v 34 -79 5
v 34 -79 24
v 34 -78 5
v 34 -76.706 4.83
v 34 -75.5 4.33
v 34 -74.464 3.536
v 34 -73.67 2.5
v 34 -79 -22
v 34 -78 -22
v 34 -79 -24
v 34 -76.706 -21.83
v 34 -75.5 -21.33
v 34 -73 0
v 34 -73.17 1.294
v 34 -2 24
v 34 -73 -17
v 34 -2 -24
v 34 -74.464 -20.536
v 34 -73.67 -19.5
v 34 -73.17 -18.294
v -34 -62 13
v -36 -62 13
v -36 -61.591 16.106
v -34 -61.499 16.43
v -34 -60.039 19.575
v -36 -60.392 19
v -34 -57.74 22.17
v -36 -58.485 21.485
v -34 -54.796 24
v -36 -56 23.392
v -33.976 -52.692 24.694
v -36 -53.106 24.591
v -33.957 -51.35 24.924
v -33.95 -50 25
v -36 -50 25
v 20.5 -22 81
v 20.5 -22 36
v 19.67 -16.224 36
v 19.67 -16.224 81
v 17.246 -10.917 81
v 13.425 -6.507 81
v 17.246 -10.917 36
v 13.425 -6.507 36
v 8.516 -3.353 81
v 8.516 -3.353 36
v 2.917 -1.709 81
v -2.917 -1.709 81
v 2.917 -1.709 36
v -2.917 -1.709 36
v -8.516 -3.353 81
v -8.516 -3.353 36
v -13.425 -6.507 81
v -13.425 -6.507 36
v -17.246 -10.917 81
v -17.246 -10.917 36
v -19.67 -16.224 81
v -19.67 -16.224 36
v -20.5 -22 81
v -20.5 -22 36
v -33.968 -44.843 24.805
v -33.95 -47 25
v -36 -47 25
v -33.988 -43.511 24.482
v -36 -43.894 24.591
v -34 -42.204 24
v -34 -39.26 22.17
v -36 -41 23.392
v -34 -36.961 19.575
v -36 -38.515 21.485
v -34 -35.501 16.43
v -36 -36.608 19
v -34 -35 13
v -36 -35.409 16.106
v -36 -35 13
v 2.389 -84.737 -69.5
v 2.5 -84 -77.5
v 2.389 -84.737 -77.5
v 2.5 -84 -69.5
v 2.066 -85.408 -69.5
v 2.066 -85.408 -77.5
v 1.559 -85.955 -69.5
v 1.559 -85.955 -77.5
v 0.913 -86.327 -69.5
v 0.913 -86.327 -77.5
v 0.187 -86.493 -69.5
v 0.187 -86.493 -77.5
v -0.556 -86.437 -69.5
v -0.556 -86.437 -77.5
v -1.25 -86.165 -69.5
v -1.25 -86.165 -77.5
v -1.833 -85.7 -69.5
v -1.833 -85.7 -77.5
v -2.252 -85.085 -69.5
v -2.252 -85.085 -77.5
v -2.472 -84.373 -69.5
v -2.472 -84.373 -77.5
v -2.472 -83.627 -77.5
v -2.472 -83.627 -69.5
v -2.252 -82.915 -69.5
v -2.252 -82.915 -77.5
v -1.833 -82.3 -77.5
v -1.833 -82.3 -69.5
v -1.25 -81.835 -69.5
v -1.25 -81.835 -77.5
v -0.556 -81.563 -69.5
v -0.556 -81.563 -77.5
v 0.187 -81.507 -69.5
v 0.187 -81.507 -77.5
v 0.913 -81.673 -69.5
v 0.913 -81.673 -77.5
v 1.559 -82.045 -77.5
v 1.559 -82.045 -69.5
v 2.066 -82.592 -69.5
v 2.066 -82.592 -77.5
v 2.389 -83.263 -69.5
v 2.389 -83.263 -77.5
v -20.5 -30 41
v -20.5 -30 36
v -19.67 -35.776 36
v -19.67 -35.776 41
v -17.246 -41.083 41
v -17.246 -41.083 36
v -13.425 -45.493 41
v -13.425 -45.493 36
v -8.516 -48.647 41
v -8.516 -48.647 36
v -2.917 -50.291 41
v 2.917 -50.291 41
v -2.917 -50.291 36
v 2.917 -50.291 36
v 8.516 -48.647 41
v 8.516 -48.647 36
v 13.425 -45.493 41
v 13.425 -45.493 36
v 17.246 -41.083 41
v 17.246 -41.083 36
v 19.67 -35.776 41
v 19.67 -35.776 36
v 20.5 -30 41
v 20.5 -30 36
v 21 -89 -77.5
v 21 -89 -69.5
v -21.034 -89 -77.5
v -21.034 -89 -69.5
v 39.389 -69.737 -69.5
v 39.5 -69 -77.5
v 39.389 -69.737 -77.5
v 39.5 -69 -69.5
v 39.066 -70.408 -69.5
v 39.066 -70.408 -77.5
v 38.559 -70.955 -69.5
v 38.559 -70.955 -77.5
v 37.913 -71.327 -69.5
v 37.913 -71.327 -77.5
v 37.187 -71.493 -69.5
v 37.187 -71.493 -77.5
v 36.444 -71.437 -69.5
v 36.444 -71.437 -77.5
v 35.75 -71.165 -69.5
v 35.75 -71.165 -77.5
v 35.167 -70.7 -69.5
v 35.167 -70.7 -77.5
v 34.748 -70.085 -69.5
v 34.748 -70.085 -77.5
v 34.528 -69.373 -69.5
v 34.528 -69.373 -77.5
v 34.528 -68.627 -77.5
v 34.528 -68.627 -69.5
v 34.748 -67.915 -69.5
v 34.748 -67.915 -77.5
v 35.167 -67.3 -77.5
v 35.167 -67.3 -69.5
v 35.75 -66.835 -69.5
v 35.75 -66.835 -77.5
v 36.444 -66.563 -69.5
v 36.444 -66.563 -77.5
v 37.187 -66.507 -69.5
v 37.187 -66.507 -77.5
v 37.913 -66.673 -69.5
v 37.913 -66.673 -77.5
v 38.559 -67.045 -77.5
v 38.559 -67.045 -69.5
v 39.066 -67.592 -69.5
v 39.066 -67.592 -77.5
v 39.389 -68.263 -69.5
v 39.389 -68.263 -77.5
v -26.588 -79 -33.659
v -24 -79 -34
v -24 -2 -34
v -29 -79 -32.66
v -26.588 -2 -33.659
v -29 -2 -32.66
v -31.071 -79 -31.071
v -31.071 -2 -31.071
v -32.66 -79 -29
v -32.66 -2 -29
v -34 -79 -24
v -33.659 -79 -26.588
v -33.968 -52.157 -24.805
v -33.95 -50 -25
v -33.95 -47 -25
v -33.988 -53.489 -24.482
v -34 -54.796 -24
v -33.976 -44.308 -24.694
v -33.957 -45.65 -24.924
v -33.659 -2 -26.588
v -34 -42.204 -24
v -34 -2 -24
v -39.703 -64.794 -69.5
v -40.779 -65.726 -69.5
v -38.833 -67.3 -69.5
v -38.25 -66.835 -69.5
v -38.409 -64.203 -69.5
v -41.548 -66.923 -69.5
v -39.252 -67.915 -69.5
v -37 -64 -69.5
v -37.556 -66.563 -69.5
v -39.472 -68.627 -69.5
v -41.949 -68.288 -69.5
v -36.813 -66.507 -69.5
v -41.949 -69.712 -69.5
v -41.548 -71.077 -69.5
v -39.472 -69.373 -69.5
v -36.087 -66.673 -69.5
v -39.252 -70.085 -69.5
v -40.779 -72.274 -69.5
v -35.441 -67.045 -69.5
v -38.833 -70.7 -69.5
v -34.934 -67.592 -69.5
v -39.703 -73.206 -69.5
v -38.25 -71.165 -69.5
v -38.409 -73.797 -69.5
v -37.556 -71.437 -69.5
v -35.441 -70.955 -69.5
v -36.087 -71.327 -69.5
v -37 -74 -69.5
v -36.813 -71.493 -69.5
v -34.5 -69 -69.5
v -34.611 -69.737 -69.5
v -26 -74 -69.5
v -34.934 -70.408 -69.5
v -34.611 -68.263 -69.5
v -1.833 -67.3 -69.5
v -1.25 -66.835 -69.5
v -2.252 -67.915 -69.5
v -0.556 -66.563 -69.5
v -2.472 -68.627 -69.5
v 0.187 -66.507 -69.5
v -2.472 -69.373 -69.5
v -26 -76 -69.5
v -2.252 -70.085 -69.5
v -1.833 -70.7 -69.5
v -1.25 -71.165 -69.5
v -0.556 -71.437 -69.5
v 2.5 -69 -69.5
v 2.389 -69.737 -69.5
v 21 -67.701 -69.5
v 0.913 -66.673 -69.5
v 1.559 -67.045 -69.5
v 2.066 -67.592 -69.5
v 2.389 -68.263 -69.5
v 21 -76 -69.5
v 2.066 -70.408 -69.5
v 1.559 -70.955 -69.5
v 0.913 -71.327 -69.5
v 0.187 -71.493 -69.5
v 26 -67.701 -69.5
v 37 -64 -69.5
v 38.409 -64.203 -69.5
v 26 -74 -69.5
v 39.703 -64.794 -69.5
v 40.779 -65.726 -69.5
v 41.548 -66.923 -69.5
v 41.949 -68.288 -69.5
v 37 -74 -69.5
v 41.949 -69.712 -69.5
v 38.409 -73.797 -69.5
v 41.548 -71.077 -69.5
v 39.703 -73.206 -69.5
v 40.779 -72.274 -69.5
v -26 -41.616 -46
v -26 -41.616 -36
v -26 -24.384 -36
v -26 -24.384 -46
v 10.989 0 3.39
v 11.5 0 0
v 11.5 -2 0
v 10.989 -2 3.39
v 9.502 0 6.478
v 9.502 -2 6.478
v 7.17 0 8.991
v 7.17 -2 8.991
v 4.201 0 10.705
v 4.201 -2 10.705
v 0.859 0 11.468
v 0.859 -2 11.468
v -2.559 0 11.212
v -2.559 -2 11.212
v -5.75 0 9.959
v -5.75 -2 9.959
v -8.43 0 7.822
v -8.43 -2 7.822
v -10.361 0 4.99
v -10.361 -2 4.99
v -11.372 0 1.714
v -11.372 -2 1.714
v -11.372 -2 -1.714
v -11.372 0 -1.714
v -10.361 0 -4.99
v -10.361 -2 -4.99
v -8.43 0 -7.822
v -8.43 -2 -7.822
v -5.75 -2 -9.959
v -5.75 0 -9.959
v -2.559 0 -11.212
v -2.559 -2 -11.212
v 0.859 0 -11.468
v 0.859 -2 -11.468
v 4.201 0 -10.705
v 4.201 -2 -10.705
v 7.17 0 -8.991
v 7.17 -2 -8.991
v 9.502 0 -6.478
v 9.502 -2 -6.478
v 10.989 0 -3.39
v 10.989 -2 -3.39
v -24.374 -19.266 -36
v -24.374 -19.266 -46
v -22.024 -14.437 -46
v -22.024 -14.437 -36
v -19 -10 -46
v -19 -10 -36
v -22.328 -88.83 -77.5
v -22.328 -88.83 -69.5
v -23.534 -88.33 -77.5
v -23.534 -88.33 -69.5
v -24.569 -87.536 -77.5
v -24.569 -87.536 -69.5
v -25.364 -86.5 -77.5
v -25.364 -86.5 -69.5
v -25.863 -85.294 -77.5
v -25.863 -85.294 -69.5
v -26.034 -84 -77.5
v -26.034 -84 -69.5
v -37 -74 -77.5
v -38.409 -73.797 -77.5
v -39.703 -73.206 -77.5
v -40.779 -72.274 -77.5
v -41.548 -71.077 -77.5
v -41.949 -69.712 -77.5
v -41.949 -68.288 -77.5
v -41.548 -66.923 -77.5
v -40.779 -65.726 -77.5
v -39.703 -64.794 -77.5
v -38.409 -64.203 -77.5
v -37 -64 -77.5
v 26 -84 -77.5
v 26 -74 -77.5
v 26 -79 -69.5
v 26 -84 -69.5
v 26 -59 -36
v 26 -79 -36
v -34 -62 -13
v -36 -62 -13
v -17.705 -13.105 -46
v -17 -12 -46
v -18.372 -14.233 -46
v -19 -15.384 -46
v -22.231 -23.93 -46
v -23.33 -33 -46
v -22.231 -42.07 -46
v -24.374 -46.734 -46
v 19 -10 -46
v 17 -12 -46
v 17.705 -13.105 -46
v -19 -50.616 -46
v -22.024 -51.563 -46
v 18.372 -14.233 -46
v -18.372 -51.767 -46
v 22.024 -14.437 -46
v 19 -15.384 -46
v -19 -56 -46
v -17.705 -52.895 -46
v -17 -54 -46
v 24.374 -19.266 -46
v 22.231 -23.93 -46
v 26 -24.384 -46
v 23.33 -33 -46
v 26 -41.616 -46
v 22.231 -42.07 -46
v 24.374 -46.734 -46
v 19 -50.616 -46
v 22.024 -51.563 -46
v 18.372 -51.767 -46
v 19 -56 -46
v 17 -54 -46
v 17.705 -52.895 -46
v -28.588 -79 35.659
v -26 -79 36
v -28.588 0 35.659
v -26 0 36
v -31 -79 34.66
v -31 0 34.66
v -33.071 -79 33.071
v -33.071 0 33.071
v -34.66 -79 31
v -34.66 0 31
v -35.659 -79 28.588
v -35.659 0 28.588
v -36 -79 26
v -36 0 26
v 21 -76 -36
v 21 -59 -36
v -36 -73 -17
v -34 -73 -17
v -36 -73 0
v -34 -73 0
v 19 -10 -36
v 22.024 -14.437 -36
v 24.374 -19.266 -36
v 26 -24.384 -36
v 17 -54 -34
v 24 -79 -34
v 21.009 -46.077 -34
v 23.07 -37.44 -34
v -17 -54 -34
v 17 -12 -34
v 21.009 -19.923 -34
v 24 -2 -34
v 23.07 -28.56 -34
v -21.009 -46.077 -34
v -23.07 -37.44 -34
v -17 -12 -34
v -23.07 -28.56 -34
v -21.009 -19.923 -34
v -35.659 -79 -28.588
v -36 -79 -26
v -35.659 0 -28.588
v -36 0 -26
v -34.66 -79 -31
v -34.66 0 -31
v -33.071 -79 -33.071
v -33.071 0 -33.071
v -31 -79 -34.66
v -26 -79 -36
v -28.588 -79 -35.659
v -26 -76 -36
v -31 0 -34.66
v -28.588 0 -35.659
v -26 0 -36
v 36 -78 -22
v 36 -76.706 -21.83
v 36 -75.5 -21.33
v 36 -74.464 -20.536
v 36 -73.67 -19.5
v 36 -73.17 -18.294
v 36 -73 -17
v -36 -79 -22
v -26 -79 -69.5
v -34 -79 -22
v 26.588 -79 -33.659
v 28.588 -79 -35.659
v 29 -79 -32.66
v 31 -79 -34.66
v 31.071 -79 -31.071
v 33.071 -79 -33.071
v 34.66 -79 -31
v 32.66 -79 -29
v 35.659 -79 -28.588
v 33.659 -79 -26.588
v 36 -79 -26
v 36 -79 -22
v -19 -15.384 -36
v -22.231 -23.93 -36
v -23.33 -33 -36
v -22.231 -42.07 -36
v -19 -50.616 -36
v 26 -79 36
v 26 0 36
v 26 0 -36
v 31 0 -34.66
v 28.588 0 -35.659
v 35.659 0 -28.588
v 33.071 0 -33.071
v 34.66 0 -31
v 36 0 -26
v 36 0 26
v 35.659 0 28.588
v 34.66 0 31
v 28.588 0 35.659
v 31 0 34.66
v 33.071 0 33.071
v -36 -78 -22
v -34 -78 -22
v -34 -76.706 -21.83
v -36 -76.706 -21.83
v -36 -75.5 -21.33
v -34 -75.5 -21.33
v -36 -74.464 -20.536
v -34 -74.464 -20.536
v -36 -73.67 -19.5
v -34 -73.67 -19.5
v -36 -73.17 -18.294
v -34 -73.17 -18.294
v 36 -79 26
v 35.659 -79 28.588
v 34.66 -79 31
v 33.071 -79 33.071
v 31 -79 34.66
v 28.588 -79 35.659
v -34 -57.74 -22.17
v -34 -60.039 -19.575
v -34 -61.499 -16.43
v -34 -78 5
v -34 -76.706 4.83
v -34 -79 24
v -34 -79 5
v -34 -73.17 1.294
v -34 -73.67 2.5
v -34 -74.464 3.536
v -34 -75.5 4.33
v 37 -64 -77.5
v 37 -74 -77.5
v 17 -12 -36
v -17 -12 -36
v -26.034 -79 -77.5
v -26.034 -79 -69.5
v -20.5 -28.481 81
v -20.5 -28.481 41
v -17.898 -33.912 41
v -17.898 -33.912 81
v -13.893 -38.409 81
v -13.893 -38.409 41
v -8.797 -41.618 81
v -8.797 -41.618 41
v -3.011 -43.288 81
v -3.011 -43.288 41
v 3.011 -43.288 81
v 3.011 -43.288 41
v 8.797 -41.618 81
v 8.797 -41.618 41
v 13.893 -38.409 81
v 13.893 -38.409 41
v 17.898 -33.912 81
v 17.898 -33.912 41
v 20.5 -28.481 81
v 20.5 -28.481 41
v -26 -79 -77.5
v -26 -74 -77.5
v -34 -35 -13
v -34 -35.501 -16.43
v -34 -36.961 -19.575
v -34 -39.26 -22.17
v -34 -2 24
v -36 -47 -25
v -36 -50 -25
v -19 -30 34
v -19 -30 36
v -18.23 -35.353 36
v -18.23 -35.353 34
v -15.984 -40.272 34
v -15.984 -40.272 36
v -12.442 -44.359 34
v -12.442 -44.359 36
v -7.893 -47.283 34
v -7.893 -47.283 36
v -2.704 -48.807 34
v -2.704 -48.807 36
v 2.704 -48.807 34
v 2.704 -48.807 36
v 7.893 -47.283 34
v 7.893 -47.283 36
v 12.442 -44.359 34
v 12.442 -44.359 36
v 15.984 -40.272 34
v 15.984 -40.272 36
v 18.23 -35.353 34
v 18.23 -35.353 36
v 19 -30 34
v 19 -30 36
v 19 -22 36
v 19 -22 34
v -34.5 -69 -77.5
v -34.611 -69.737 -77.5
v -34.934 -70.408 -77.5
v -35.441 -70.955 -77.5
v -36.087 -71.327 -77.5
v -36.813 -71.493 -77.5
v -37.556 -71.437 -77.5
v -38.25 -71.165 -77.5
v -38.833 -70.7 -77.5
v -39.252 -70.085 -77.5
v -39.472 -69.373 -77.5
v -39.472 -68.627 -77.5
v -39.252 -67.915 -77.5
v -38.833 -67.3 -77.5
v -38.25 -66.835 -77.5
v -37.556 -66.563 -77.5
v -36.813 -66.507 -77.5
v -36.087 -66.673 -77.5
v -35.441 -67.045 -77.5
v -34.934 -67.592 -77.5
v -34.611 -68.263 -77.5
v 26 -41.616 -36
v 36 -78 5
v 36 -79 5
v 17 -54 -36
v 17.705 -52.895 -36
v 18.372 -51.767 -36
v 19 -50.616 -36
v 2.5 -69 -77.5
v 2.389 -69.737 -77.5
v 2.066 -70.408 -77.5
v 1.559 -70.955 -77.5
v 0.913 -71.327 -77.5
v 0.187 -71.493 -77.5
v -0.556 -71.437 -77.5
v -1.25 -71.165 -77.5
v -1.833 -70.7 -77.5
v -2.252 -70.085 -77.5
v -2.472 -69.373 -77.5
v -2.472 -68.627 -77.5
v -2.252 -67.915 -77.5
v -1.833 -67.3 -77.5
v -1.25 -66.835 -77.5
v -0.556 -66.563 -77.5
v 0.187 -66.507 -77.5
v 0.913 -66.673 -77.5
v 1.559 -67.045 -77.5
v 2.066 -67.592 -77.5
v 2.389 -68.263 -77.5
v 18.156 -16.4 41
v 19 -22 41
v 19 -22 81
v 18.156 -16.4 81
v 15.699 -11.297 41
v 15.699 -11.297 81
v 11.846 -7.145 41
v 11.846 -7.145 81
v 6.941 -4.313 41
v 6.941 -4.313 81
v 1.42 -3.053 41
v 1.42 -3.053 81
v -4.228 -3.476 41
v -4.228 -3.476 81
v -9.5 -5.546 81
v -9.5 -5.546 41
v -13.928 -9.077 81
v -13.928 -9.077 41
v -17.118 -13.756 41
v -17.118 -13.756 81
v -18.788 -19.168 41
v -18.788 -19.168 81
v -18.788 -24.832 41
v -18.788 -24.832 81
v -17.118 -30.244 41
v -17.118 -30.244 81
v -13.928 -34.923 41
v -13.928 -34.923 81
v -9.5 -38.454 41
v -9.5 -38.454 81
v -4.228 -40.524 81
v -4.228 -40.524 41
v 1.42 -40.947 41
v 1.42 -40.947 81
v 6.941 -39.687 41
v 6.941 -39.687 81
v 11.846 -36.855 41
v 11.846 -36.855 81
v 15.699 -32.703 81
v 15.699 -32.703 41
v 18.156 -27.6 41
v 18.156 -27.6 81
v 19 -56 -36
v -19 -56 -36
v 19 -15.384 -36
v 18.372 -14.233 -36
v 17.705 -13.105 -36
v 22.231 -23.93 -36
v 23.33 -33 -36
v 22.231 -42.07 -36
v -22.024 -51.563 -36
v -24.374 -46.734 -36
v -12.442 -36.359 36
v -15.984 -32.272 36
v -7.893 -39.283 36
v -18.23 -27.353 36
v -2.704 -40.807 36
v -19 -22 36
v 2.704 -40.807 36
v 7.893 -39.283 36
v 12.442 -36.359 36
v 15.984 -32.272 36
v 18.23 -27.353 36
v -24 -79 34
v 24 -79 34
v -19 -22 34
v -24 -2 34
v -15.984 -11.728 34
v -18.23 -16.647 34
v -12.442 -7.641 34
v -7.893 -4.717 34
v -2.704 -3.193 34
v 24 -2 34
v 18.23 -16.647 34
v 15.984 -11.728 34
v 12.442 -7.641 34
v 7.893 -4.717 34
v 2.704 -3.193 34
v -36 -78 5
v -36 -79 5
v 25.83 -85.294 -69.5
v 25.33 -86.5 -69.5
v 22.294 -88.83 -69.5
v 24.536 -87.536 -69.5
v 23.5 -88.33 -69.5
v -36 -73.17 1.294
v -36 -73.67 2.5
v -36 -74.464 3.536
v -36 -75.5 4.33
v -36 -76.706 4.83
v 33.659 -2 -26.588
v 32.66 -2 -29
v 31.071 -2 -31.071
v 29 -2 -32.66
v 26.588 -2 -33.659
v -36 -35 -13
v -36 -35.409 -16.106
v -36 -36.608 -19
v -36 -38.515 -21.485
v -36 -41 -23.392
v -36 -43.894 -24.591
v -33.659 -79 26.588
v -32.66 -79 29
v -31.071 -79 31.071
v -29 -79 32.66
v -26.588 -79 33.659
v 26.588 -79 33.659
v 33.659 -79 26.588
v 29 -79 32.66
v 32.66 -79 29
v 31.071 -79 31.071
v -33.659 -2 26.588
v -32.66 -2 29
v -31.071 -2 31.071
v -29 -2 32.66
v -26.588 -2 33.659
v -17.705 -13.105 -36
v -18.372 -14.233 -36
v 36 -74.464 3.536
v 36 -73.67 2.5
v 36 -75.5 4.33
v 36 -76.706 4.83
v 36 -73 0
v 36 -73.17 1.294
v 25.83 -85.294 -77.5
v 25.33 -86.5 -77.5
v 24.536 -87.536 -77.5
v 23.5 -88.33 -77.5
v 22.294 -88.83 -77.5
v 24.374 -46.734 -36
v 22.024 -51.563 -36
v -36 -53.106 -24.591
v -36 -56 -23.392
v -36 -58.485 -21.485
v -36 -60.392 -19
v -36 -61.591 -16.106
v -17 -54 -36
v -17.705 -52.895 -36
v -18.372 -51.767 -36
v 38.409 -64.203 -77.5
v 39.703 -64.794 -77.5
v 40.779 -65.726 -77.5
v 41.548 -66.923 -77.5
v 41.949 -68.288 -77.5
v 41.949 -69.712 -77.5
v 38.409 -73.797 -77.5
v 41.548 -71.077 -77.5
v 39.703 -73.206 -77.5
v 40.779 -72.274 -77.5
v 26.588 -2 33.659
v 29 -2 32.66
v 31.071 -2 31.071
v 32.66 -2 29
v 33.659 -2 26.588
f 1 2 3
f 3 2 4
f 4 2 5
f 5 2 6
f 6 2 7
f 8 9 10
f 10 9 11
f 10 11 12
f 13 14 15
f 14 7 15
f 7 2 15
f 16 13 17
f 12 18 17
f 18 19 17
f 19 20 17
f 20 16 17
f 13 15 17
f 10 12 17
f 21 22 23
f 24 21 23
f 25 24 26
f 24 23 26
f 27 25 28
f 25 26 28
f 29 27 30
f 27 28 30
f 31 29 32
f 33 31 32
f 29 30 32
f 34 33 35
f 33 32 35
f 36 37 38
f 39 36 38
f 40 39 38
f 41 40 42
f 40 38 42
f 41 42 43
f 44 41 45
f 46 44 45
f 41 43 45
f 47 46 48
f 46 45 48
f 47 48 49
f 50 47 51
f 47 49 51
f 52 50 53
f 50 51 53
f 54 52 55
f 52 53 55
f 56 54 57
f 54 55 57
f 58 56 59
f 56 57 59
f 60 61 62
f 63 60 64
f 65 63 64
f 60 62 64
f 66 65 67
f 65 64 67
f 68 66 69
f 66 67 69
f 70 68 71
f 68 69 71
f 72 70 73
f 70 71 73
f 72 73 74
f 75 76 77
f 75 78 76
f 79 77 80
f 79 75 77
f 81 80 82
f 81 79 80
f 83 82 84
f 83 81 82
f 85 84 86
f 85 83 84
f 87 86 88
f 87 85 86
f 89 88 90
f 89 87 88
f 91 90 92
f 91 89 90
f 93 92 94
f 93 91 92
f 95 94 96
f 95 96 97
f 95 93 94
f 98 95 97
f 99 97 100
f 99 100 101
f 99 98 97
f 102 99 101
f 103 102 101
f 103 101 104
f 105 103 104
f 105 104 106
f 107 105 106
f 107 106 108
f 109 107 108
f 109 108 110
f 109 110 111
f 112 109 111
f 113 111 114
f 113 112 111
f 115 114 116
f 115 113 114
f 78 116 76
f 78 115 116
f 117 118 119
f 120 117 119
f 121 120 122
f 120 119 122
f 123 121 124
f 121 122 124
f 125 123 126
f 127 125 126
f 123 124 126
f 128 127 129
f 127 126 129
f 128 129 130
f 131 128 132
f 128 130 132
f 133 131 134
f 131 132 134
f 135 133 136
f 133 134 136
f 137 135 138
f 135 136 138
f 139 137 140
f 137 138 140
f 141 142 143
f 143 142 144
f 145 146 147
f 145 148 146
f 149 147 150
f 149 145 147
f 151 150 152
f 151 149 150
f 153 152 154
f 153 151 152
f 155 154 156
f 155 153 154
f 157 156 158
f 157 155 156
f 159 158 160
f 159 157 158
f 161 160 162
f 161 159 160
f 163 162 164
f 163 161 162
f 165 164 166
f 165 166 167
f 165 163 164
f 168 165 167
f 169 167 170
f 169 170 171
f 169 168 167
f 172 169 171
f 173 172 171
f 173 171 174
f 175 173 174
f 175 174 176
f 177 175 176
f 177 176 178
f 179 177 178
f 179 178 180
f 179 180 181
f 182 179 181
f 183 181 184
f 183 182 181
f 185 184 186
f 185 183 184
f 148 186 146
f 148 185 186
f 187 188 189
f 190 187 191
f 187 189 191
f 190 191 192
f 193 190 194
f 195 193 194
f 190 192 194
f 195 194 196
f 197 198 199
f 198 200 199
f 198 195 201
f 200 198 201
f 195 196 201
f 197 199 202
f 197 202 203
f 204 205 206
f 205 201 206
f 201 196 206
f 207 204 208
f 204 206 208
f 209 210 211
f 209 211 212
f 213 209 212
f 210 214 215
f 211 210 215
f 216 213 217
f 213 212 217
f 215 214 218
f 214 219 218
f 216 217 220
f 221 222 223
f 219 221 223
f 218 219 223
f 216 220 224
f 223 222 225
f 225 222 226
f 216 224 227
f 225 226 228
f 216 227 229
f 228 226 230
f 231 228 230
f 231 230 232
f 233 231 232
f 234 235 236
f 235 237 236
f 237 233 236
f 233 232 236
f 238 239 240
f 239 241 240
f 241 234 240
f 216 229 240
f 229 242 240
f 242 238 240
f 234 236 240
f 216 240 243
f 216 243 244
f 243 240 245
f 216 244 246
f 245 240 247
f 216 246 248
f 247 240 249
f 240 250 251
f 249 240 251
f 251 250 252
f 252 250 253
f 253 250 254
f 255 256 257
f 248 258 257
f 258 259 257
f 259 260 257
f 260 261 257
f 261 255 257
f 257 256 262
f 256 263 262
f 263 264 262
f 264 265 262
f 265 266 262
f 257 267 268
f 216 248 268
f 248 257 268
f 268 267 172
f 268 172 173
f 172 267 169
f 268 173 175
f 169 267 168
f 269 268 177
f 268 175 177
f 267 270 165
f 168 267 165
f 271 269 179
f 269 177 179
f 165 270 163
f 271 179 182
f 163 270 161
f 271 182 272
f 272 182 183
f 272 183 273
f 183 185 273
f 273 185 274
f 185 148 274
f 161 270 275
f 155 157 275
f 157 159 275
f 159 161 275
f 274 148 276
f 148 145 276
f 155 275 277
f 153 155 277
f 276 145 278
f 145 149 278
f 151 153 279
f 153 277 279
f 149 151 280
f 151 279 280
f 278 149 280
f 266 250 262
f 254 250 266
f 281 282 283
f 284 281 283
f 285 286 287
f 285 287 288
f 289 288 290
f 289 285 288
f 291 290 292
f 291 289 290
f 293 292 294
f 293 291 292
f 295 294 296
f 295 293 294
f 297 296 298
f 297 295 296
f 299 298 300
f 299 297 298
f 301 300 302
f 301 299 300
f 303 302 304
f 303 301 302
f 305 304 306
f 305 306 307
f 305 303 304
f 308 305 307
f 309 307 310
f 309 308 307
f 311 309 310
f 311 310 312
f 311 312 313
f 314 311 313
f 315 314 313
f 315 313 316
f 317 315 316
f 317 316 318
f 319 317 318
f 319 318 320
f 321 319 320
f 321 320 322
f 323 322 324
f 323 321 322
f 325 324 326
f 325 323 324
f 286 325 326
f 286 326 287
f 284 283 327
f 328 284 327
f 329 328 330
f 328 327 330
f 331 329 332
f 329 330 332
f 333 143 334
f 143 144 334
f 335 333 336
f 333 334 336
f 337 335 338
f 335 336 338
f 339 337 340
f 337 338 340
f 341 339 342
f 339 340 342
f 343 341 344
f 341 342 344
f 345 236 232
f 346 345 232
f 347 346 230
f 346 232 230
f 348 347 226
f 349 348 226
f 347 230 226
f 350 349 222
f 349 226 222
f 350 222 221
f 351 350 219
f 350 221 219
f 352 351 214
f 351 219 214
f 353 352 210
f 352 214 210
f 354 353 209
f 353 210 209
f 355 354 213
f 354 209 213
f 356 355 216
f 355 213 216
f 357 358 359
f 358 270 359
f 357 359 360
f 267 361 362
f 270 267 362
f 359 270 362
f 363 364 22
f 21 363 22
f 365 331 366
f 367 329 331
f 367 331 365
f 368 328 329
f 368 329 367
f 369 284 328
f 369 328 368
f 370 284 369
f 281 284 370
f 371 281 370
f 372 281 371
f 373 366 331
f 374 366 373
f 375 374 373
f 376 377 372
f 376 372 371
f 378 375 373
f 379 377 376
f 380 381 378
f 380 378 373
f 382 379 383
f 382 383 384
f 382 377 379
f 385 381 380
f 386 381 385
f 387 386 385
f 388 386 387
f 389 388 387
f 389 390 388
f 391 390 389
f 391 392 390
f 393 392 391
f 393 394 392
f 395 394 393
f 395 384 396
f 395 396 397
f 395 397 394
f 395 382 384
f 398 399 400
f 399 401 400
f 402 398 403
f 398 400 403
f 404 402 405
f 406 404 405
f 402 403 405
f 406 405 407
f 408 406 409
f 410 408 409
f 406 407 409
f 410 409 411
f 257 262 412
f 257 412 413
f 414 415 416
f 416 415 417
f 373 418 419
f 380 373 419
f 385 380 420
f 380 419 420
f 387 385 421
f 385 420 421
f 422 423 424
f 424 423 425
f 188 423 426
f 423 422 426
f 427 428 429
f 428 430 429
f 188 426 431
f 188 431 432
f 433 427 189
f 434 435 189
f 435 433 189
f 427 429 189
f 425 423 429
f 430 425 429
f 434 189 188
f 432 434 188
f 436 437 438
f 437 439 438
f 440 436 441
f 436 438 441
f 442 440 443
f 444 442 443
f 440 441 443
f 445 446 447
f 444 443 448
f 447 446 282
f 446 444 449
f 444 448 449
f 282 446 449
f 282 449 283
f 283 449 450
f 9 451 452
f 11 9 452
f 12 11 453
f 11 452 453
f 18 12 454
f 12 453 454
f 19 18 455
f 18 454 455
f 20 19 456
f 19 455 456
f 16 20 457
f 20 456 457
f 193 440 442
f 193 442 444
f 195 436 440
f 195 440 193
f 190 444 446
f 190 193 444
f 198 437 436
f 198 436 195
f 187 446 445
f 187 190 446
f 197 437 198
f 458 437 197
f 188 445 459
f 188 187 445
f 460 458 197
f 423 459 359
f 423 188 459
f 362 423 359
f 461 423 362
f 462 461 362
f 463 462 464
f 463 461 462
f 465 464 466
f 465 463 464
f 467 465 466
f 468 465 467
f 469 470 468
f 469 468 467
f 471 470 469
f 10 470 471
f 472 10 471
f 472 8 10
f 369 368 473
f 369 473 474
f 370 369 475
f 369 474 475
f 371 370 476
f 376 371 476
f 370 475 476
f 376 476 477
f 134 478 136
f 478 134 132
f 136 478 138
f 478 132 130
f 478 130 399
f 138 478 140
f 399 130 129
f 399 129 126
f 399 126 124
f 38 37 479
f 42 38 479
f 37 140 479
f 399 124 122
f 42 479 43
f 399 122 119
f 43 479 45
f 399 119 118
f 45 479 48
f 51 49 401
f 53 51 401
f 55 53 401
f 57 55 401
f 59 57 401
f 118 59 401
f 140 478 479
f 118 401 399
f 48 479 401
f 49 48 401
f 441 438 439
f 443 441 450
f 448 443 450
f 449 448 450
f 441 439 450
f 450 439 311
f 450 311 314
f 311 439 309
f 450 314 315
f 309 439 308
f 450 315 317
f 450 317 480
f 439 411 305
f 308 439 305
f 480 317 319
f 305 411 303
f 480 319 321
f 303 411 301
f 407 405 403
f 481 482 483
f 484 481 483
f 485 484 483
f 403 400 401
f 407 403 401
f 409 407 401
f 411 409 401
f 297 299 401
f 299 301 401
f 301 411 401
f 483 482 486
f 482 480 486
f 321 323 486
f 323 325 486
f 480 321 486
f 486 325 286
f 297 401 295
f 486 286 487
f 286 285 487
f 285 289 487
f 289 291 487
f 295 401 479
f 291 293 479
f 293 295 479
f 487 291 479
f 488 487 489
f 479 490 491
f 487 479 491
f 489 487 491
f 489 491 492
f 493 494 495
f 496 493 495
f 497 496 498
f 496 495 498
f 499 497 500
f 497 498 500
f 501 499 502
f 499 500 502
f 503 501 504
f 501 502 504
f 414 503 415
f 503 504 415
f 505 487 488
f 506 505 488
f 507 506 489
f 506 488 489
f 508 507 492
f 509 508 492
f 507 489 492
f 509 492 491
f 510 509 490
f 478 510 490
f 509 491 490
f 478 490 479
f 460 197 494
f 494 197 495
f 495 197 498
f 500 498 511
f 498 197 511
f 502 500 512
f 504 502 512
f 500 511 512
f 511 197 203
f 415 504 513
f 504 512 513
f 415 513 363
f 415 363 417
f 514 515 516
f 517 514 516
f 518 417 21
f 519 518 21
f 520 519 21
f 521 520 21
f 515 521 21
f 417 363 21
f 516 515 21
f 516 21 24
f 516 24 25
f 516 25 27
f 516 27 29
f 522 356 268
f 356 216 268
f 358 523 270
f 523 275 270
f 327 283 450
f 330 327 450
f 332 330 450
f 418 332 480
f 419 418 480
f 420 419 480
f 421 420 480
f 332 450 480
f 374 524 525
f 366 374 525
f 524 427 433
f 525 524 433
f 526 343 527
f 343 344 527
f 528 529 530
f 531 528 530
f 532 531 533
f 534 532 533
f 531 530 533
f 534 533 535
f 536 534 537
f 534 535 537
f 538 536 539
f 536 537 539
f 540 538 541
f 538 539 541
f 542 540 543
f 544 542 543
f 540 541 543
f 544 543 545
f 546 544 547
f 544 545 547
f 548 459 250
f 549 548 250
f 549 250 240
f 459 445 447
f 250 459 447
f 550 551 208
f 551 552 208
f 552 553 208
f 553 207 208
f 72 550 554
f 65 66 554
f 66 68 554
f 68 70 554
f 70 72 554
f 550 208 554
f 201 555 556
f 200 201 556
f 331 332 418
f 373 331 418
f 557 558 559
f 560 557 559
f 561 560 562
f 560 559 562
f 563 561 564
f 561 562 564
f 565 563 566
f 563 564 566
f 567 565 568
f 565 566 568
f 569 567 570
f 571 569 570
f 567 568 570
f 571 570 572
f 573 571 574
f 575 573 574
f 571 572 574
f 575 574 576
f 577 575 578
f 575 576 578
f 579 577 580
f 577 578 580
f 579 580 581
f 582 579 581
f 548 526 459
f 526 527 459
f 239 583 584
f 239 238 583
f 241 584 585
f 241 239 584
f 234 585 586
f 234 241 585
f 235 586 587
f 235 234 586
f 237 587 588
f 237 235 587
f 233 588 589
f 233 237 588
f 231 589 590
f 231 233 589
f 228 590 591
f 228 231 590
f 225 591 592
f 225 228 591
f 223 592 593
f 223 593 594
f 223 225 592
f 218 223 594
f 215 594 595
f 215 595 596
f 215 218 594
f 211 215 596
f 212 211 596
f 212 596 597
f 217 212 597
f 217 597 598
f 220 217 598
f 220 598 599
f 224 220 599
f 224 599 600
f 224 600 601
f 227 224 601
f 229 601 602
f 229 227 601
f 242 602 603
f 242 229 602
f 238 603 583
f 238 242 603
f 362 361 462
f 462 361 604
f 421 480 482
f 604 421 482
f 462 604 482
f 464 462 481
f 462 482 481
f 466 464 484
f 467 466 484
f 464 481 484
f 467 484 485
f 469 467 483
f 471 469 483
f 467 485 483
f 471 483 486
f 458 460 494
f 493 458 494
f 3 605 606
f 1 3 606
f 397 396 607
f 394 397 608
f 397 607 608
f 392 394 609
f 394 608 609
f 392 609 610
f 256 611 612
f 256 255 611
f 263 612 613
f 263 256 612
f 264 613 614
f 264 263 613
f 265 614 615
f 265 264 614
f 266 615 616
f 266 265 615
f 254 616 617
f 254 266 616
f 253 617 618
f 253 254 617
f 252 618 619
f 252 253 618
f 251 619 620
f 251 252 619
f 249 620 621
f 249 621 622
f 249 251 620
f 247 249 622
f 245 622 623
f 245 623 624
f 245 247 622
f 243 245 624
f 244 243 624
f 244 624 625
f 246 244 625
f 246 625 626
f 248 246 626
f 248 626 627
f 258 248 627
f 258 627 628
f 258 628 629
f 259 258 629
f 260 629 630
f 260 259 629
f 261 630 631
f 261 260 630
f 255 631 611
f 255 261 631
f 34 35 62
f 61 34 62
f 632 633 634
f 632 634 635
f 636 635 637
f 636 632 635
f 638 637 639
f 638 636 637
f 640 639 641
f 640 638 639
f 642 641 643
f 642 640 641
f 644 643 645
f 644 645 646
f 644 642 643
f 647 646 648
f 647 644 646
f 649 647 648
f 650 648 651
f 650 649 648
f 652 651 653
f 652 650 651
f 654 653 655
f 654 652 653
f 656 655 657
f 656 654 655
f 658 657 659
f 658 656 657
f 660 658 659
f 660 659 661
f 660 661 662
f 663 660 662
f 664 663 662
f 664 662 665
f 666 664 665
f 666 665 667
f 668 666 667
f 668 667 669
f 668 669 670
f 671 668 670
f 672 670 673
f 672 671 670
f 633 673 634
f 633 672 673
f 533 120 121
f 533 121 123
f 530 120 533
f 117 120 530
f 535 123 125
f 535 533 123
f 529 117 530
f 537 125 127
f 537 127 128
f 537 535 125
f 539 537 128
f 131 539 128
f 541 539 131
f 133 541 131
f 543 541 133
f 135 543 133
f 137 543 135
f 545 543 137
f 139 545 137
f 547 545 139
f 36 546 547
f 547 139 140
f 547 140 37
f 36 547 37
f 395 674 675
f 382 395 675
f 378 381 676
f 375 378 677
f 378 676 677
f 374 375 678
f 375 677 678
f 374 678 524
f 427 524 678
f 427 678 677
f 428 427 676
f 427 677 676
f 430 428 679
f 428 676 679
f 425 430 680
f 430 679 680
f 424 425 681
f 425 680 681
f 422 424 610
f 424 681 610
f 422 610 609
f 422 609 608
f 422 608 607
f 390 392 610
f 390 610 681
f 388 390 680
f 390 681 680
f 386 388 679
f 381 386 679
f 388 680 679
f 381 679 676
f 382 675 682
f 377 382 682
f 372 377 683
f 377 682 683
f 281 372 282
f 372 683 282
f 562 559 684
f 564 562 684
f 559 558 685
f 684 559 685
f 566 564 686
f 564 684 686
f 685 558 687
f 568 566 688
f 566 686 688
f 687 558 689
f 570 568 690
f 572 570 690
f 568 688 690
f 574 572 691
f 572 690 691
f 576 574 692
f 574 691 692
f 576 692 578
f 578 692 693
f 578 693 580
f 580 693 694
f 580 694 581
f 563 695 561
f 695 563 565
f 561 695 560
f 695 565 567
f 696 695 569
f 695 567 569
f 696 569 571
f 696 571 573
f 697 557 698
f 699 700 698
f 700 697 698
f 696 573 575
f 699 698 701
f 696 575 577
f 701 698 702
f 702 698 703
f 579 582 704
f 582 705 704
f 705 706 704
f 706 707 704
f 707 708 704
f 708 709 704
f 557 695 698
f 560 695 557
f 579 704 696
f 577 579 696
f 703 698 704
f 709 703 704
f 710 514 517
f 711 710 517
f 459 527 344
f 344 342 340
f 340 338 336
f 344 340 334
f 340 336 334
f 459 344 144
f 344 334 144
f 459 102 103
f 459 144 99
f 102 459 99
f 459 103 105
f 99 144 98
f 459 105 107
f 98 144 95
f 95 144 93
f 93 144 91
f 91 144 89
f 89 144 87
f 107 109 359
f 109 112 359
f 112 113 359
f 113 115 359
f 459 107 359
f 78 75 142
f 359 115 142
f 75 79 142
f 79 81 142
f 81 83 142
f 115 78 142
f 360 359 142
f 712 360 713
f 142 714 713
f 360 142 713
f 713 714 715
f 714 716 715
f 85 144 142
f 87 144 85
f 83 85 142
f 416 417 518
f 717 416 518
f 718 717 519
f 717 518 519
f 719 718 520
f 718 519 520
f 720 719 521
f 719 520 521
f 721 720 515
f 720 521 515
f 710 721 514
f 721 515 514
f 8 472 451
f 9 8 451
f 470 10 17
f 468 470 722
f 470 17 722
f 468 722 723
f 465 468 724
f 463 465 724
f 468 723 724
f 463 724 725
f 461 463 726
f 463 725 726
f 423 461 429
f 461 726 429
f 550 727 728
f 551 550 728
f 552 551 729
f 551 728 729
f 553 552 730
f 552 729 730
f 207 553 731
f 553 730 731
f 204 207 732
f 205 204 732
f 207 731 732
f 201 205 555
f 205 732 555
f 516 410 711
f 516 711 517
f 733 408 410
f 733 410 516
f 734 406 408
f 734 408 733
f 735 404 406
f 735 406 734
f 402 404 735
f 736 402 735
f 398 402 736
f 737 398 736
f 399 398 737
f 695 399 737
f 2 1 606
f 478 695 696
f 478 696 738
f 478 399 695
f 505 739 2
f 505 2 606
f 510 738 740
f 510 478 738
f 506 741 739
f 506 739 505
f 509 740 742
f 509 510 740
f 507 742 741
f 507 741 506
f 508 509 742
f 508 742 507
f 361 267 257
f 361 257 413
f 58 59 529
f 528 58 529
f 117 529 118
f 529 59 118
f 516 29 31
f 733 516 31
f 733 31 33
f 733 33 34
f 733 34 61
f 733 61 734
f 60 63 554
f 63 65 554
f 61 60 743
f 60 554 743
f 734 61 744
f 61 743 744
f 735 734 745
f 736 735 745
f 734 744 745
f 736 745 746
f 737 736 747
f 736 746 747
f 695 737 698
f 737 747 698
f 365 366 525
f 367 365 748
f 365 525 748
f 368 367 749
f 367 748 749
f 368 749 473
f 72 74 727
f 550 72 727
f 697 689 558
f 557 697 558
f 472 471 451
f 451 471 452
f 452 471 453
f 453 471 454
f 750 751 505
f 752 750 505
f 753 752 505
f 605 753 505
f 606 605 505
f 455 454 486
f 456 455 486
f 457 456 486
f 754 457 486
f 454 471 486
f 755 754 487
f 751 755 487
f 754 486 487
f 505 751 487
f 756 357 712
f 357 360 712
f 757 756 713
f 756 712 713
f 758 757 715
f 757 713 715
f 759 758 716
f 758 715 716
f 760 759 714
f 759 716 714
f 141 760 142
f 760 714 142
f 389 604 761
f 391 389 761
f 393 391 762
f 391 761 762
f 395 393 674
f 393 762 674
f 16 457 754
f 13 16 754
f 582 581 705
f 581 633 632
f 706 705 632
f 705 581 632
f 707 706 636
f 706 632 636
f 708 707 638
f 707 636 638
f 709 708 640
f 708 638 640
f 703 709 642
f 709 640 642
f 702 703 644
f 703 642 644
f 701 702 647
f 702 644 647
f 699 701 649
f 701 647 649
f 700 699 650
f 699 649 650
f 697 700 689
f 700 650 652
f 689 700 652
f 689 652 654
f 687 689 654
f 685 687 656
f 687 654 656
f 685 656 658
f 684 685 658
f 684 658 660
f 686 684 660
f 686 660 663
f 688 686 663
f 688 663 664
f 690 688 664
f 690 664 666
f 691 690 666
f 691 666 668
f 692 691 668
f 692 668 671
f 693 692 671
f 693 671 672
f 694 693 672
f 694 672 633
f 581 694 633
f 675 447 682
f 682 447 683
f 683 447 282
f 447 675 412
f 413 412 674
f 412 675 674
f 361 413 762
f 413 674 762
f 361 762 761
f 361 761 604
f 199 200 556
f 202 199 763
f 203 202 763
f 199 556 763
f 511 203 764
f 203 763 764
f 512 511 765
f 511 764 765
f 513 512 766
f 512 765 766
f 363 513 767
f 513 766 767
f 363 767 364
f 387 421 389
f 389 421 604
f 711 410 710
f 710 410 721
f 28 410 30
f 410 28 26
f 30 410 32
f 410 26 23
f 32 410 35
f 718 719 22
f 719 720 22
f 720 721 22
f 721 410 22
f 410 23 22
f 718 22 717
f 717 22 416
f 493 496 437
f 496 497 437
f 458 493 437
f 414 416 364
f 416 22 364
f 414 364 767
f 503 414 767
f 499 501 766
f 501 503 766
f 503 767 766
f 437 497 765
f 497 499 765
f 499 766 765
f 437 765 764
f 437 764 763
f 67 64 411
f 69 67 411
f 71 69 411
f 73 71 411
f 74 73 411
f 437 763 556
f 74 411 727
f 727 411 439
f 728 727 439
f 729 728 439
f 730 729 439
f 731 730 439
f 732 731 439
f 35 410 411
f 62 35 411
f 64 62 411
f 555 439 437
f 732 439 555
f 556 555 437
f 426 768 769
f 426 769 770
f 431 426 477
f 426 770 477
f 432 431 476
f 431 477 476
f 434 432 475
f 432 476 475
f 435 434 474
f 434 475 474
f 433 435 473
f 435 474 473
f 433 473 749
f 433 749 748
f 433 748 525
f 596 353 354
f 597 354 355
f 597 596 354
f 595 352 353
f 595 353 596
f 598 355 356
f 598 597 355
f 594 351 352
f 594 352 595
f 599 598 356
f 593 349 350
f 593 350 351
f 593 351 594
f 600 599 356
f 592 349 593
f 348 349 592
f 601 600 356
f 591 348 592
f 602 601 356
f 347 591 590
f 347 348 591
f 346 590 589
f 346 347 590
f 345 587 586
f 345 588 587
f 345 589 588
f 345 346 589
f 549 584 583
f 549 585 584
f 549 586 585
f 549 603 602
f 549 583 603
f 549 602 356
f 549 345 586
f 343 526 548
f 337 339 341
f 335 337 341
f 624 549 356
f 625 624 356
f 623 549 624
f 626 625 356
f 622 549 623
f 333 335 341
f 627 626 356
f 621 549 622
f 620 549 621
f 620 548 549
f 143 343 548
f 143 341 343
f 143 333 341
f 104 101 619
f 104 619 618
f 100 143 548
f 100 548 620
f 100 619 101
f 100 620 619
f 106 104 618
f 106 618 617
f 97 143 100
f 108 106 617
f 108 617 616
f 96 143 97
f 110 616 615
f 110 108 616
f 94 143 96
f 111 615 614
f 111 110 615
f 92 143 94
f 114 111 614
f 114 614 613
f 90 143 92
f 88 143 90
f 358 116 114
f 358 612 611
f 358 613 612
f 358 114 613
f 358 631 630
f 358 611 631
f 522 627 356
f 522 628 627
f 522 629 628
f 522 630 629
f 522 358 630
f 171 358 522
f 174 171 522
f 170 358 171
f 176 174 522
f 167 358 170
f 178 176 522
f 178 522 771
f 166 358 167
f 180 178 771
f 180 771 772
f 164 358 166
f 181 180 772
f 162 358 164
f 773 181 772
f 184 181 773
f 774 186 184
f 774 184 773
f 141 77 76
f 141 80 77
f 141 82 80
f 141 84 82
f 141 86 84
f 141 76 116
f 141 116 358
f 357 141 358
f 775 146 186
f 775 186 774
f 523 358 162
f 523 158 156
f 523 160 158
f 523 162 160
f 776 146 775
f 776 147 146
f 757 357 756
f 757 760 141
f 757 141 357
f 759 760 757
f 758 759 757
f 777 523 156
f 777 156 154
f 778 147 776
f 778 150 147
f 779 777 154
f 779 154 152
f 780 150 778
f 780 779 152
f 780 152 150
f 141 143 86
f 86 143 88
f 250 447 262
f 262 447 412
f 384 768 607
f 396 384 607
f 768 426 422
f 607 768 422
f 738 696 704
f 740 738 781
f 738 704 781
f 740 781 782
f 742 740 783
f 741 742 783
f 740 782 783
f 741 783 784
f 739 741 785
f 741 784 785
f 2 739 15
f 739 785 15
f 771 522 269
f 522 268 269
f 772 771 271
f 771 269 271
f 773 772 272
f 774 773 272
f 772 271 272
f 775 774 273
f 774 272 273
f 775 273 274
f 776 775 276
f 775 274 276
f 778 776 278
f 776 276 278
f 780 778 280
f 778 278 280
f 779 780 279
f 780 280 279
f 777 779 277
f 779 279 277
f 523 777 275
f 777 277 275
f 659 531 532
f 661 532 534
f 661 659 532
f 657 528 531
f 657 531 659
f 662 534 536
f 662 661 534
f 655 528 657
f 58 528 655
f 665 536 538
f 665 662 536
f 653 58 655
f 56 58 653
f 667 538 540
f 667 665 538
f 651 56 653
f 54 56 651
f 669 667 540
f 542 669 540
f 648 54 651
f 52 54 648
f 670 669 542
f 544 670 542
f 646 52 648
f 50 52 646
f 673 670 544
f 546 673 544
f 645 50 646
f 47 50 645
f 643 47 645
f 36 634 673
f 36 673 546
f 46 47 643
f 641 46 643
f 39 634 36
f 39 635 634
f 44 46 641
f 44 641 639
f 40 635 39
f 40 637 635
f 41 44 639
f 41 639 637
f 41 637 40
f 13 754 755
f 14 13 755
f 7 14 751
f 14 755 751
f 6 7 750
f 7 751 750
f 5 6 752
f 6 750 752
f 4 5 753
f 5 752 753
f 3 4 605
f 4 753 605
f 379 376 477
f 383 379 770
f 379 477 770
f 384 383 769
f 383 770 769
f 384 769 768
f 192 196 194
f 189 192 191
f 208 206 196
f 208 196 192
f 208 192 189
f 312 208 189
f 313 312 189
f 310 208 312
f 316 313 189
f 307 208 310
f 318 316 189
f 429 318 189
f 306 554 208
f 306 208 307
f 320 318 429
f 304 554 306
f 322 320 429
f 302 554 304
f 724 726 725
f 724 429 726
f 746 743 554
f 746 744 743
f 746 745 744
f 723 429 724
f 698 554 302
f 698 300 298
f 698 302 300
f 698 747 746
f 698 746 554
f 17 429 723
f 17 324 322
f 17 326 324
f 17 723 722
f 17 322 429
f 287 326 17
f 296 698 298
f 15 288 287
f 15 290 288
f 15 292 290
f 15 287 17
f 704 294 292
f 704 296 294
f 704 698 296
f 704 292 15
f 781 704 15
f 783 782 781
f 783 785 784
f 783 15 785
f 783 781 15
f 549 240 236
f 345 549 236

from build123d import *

# Parameters (mm, degrees)
F0_R      = 11.5
F1_DEPTH  = 2
F3_DEPTH  = 77
F5_DEPTH  = 3
F7_DEPTH  = 3
F9_DEPTH  = 5
F11_DEPTH = 3
F12_R     = 19
F13_DEPTH = 8
F14_R     = 19
F15_DEPTH = 40
F16_W     = 52
F16_H     = 3
F17_DEPTH = 38.5
F19_DEPTH = 3
F21_DEPTH = 10
F22_W     = 3
F22_H     = 38.5
F23_DEPTH = 5
F25_R     = 2.5
F25_W     = 47
F25_H     = 2
F26_DEPTH = 5
F27_DEPTH = 1
F29_DEPTH = 75
F30_DEPTH = 2


with BuildPart() as f1:
    # F0 (on Front) → F1 (new body)
    with BuildSketch(Plane.XZ):
        with BuildLine():
            Line((26, 36), (-26, 36))
            ThreePointArc((-26, 36), (-33.0710678119, 33.0710678119), (-36, 26))
            Line((-36, 26), (-36, -26))
            ThreePointArc((-36, -26), (-33.0710678119, -33.0710678119), (-26, -36))
            Line((-26, -36), (26, -36))
            ThreePointArc((26, -36), (33.0710678119, -33.0710678119), (36, -26))
            Line((36, -26), (36, 26))
            ThreePointArc((36, 26), (33.0710678119, 33.0710678119), (26, 36))
        make_face()
        with BuildLine():
            Line((24, -34), (-24, -34))
            ThreePointArc((-24, -34), (-31.0710678119, -31.0710678119), (-34, -24))
            Line((-34, -24), (-34, 24))
            ThreePointArc((-34, 24), (-31.0710678119, 31.0710678119), (-24, 34))
            Line((-24, 34), (24, 34))
            ThreePointArc((24, 34), (31.0710678119, 31.0710678119), (34, 24))
            Line((34, 24), (34, -24))
            ThreePointArc((34, -24), (31.0710678119, -31.0710678119), (24, -34))
        make_face(mode=Mode.SUBTRACT)
        with BuildLine():
            ThreePointArc((-34, -24), (-31.0710678119, -31.0710678119), (-24, -34))
            Line((-24, -34), (24, -34))
            ThreePointArc((24, -34), (31.0710678119, -31.0710678119), (34, -24))
            Line((34, -24), (34, 24))
            ThreePointArc((34, 24), (31.0710678119, 31.0710678119), (24, 34))
            Line((24, 34), (-24, 34))
            ThreePointArc((-24, 34), (-31.0710678119, 31.0710678119), (-34, 24))
            Line((-34, 24), (-34, -24))
        make_face()
        Circle(F0_R, mode=Mode.SUBTRACT)
    extrude(amount=F1_DEPTH)

    # F2 (on face) → F3 (join)
    with BuildSketch(Plane.XZ.offset(2)):
        with BuildLine():
            Line((26, 36), (-26, 36))
            ThreePointArc((-26, 36), (-33.0710678119, 33.0710678119), (-36, 26))
            Line((-36, 26), (-36, -26))
            ThreePointArc((-36, -26), (-33.0710678119, -33.0710678119), (-26, -36))
            Line((-26, -36), (26, -36))
            ThreePointArc((26, -36), (33.0710678119, -33.0710678119), (36, -26))
            Line((36, -26), (36, 26))
            ThreePointArc((36, 26), (33.0710678119, 33.0710678119), (26, 36))
        make_face()
        with BuildLine():
            Line((24, -34), (-24, -34))
            ThreePointArc((-24, -34), (-31.0710678119, -31.0710678119), (-34, -24))
            Line((-34, -24), (-34, 24))
            ThreePointArc((-34, 24), (-31.0710678119, 31.0710678119), (-24, 34))
            Line((-24, 34), (24, 34))
            ThreePointArc((24, 34), (31.0710678119, 31.0710678119), (34, 24))
            Line((34, 24), (34, -24))
            ThreePointArc((34, -24), (31.0710678119, -31.0710678119), (24, -34))
        make_face(mode=Mode.SUBTRACT)
    extrude(amount=F3_DEPTH)

    # F4 (on face) → F5 (cut)
    with BuildSketch(Plane(origin=(-36, 0, 0), x_dir=(0, -1, 0), z_dir=(-1, 0, 0))):
        with BuildLine():
            ThreePointArc((62, 13), (58.4852813742, 21.4852813742), (50, 25))
            Line((50, 25), (47, 25))
            ThreePointArc((47, 25), (38.5147186258, 21.4852813742), (35, 13))
            Line((35, 13), (35, -13))
            ThreePointArc((35, -13), (38.5147186258, -21.4852813742), (47, -25))
            Line((47, -25), (50, -25))
            ThreePointArc((50, -25), (58.4852813742, -21.4852813742), (62, -13))
            Line((62, -13), (62, 13))
        make_face()
    extrude(amount=-F5_DEPTH, mode=Mode.SUBTRACT)

    # F6 (on face) → F7 (cut)
    with BuildSketch(Plane.XY.offset(36)):
        with BuildLine():
            Line((19, -30), (19, -22))
            ThreePointArc((19, -22), (0, -3), (-19, -22))
            Line((-19, -22), (-19, -30))
            ThreePointArc((-19, -30), (0, -49), (19, -30))
        make_face()
    extrude(amount=-F7_DEPTH, mode=Mode.SUBTRACT)

    # F8 (on face) → F9 (join)
    with BuildSketch(Plane.XY.offset(36)):
        with BuildLine():
            Line((-20.5, -22), (-20.5, -30))
            ThreePointArc((-20.5, -30), (0, -50.5), (20.5, -30))
            Line((20.5, -30), (20.5, -22))
            ThreePointArc((20.5, -22), (0, -1.5), (-20.5, -22))
        make_face()
        with BuildLine():
            ThreePointArc((-19, -22), (0, -3), (19, -22))
            Line((19, -22), (19, -22.3025978408))
            Line((19, -22.3025978408), (19, -29.6974021592))
            Line((19, -29.6974021592), (19, -30))
            ThreePointArc((19, -30), (0, -49), (-19, -30))
            Line((-19, -30), (-19, -22))
        make_face(mode=Mode.SUBTRACT)
        with BuildLine():
            Line((19, -22.3025978408), (19, -22))
            ThreePointArc((19, -22), (0, -3), (-19, -22))
            Line((-19, -22), (-19, -30))
            ThreePointArc((-19, -30), (0, -49), (19, -30))
            Line((19, -30), (19, -29.6974021592))
            Line((19, -29.6974021592), (19, -22.3025978408))
        make_face()
    extrude(amount=F9_DEPTH)

    # F10 (on face) → F11 (join)
    with BuildSketch(Plane.XY.offset(36)):
        with BuildLine():
            Line((20.5, -30), (20.5, -22))
            ThreePointArc((20.5, -22), (0, -1.5), (-20.5, -22))
            Line((-20.5, -22), (-20.5, -30))
            ThreePointArc((-20.5, -30), (0, -50.5), (20.5, -30))
        make_face()
    extrude(amount=F11_DEPTH)

    # F12 (on face) → F13 (cut)
    with BuildSketch(Plane.XY.offset(41)):
        with Locations((0, -22)):
            Circle(F12_R)
    extrude(amount=-F13_DEPTH, mode=Mode.SUBTRACT)

    # F14 (on face) → F15 (join)
    with BuildSketch(Plane.XY.offset(41)):
        with BuildLine():
            Line((-20.5, -22), (-20.5, -28.4807406984))
            ThreePointArc((-20.5, -28.4807406984), (0, -43.5), (20.5, -28.4807406984))
            Line((20.5, -28.4807406984), (20.5, -22))
            ThreePointArc((20.5, -22), (0, -1.5), (-20.5, -22))
        make_face()
        with Locations((0, -22)):
            Circle(F14_R, mode=Mode.SUBTRACT)
    extrude(amount=F15_DEPTH)

    # F16 (on face) → F17 (join)
    with BuildSketch(Plane(origin=(0, 0, -36), x_dir=(1, 0, 0), z_dir=(0, 0, -1))):
        with Locations((0, 77.5)):
            Rectangle(F16_W, F16_H)
    extrude(amount=F17_DEPTH)

    # F18 (on face) → F19 (cut)
    with BuildSketch(Plane(origin=(0, 0, -36), x_dir=(1, 0, 0), z_dir=(0, 0, -1))):
        with BuildLine():
            Line((-17, 12), (17, 12))
            ThreePointArc((17, 12), (23.3298247558, 33), (17, 54))
            Line((17, 54), (-17, 54))
            ThreePointArc((-17, 54), (-23.3298247558, 33), (-17, 12))
        make_face()
    extrude(amount=-F19_DEPTH, mode=Mode.SUBTRACT)

    # F20 (on face) → F21 (join)
    with BuildSketch(Plane(origin=(0, 0, -36), x_dir=(1, 0, 0), z_dir=(0, 0, -1))):
        with BuildLine():
            ThreePointArc((19, 50.6158820109), (23.3298247558, 33), (19, 15.3841179891))
            Line((19, 15.3841179891), (19, 10))
            ThreePointArc((19, 10), (23.2866263695, 16.8090036252), (26, 24.3836521016))
            Line((26, 24.3836521016), (26, 41.6163478984))
            ThreePointArc((26, 41.6163478984), (23.2866263695, 49.1909963748), (19, 56))
            Line((19, 56), (19, 50.6158820109))
        make_face()
        with BuildLine():
            Line((-19, 56), (-19, 50.6158820109))
            ThreePointArc((-19, 50.6158820109), (-18.0437883513, 52.3338197434), (-17, 54))
            Line((-17, 54), (17, 54))
            ThreePointArc((17, 54), (18.0437883513, 52.3338197434), (19, 50.6158820109))
            Line((19, 50.6158820109), (19, 56))
            Line((19, 56), (-19, 56))
        make_face()
        with BuildLine():
            Line((-19, 10), (-19, 15.3841179891))
            ThreePointArc((-19, 15.3841179891), (-23.3298247558, 33), (-19, 50.6158820109))
            Line((-19, 50.6158820109), (-19, 56))
            ThreePointArc((-19, 56), (-23.2866263695, 49.1909963748), (-26, 41.6163478984))
            Line((-26, 41.6163478984), (-26, 24.3836521016))
            ThreePointArc((-26, 24.3836521016), (-23.2866263695, 16.8090036252), (-19, 10))
        make_face()
        with BuildLine():
            Line((17, 12), (-17, 12))
            ThreePointArc((-17, 12), (-18.0437883513, 13.6661802566), (-19, 15.3841179891))
            Line((-19, 15.3841179891), (-19, 10))
            Line((-19, 10), (19, 10))
            Line((19, 10), (19, 15.3841179891))
            ThreePointArc((19, 15.3841179891), (18.0437883513, 13.6661802566), (17, 12))
        make_face()
    extrude(amount=F21_DEPTH)

    # F22 (on face) → F23 (join)
    with BuildSketch(Plane.YZ.offset(26)):
        Polygon((-76, -36), (-76, -74.5), (-69, -74.5), (-59, -36), align=None)
        with Locations((-77.5, -55.25)):
            Rectangle(F22_W, F22_H)
    extrude(amount=-F23_DEPTH)

    # F25 (on face) → F26 (join)
    with BuildSketch(Plane(origin=(0, 0, -74.5), x_dir=(1, 0, 0), z_dir=(0, 0, -1))):
        with BuildLine():
            Line((37, 74), (26, 74))
            Line((26, 74), (21, 74))
            Line((21, 74), (-26, 74))
            Line((-26, 74), (-37, 74))
            ThreePointArc((-37, 74), (-42, 69), (-37, 64))
            Line((-37, 64), (37, 64))
            ThreePointArc((37, 64), (42, 69), (37, 74))
        make_face()
        with Locations((-37, 69)):
            Circle(F25_R, mode=Mode.SUBTRACT)
        with Locations((0, 69)):
            Circle(F25_R, mode=Mode.SUBTRACT)
        with Locations((37, 69)):
            Circle(F25_R, mode=Mode.SUBTRACT)
        Polygon((26, 79), (-26, 79), (-26, 76), (21, 76), (21, 74), (26, 74), align=None)
        with Locations((-2.5, 75)):
            Rectangle(F25_W, F25_H)
        with BuildLine():
            Line((-26.0336585343, 79), (-26, 79))
            Line((-26, 79), (26, 79))
            Line((26, 79), (26, 84))
            ThreePointArc((26, 84), (24.5355339059, 87.5355339059), (21, 89))
            Line((21, 89), (-21.0336585343, 89))
            ThreePointArc((-21.0336585343, 89), (-24.5691924402, 87.5355339059), (-26.0336585343, 84))
            Line((-26.0336585343, 84), (-26.0336585343, 79))
        make_face()
        with Locations((0, 84)):
            Circle(F25_R, mode=Mode.SUBTRACT)
    extrude(amount=-F26_DEPTH)

    # F27 (add): faces of the model
    f27_faces = [f1.faces().sort_by_distance(p)[0] for p in [
        (23.5, -77.5, -74.5),
        (-2.5, -77.5, -74.5),
        (23.5, -72.5, -74.5),
        (-26.0168292671, -79.5298586246, -74.5),
        (-41.1514718626, -69, -74.5),
    ]]
    extrude(f27_faces, amount=F27_DEPTH)

    # F28 (on face) → F29 (cut)
    with BuildSketch(Plane.YZ.offset(36)):
        with BuildLine():
            Line((-78, 5), (-79, 5))
            Line((-79, 5), (-79, -22))
            Line((-79, -22), (-78, -22))
            ThreePointArc((-78, -22), (-74.4644660941, -20.5355339059), (-73, -17))
            Line((-73, -17), (-73, 0))
            ThreePointArc((-73, 0), (-74.4644660941, 3.5355339059), (-78, 5))
        make_face()
    extrude(amount=-F29_DEPTH, mode=Mode.SUBTRACT)

    # F30 (add): a face of the model
    f30_faces = [f1.faces().sort_by_distance(p)[0] for p in [
        (-0.0056811519, -75.1326620312, -75.5),
    ]]
    extrude(f30_faces, amount=F30_DEPTH)


solid = f1.part
